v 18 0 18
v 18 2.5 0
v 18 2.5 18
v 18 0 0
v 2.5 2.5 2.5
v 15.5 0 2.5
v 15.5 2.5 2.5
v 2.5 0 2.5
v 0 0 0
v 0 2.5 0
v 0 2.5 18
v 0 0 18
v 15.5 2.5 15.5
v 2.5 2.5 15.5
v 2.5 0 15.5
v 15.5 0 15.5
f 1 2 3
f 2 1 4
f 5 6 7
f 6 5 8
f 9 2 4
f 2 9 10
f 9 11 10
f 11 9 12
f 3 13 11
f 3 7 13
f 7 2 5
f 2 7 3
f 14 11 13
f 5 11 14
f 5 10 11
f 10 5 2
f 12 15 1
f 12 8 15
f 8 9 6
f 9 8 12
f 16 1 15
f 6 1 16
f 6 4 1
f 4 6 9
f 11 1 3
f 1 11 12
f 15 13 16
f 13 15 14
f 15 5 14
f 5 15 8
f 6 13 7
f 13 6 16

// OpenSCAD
// U-shaped spring clip.
$fn = 60;
eps = 0.02;
clip_w = 18;
clip_h = 18;
clip_t = 2.5;
union() { cube([clip_w,clip_t,clip_t]); translate([0,0,clip_h-clip_t]) cube([clip_w,clip_t,clip_t]); cube([clip_t,clip_t,clip_h]); translate([clip_w-clip_t,0,0]) cube([clip_t,clip_t,clip_h]); }
